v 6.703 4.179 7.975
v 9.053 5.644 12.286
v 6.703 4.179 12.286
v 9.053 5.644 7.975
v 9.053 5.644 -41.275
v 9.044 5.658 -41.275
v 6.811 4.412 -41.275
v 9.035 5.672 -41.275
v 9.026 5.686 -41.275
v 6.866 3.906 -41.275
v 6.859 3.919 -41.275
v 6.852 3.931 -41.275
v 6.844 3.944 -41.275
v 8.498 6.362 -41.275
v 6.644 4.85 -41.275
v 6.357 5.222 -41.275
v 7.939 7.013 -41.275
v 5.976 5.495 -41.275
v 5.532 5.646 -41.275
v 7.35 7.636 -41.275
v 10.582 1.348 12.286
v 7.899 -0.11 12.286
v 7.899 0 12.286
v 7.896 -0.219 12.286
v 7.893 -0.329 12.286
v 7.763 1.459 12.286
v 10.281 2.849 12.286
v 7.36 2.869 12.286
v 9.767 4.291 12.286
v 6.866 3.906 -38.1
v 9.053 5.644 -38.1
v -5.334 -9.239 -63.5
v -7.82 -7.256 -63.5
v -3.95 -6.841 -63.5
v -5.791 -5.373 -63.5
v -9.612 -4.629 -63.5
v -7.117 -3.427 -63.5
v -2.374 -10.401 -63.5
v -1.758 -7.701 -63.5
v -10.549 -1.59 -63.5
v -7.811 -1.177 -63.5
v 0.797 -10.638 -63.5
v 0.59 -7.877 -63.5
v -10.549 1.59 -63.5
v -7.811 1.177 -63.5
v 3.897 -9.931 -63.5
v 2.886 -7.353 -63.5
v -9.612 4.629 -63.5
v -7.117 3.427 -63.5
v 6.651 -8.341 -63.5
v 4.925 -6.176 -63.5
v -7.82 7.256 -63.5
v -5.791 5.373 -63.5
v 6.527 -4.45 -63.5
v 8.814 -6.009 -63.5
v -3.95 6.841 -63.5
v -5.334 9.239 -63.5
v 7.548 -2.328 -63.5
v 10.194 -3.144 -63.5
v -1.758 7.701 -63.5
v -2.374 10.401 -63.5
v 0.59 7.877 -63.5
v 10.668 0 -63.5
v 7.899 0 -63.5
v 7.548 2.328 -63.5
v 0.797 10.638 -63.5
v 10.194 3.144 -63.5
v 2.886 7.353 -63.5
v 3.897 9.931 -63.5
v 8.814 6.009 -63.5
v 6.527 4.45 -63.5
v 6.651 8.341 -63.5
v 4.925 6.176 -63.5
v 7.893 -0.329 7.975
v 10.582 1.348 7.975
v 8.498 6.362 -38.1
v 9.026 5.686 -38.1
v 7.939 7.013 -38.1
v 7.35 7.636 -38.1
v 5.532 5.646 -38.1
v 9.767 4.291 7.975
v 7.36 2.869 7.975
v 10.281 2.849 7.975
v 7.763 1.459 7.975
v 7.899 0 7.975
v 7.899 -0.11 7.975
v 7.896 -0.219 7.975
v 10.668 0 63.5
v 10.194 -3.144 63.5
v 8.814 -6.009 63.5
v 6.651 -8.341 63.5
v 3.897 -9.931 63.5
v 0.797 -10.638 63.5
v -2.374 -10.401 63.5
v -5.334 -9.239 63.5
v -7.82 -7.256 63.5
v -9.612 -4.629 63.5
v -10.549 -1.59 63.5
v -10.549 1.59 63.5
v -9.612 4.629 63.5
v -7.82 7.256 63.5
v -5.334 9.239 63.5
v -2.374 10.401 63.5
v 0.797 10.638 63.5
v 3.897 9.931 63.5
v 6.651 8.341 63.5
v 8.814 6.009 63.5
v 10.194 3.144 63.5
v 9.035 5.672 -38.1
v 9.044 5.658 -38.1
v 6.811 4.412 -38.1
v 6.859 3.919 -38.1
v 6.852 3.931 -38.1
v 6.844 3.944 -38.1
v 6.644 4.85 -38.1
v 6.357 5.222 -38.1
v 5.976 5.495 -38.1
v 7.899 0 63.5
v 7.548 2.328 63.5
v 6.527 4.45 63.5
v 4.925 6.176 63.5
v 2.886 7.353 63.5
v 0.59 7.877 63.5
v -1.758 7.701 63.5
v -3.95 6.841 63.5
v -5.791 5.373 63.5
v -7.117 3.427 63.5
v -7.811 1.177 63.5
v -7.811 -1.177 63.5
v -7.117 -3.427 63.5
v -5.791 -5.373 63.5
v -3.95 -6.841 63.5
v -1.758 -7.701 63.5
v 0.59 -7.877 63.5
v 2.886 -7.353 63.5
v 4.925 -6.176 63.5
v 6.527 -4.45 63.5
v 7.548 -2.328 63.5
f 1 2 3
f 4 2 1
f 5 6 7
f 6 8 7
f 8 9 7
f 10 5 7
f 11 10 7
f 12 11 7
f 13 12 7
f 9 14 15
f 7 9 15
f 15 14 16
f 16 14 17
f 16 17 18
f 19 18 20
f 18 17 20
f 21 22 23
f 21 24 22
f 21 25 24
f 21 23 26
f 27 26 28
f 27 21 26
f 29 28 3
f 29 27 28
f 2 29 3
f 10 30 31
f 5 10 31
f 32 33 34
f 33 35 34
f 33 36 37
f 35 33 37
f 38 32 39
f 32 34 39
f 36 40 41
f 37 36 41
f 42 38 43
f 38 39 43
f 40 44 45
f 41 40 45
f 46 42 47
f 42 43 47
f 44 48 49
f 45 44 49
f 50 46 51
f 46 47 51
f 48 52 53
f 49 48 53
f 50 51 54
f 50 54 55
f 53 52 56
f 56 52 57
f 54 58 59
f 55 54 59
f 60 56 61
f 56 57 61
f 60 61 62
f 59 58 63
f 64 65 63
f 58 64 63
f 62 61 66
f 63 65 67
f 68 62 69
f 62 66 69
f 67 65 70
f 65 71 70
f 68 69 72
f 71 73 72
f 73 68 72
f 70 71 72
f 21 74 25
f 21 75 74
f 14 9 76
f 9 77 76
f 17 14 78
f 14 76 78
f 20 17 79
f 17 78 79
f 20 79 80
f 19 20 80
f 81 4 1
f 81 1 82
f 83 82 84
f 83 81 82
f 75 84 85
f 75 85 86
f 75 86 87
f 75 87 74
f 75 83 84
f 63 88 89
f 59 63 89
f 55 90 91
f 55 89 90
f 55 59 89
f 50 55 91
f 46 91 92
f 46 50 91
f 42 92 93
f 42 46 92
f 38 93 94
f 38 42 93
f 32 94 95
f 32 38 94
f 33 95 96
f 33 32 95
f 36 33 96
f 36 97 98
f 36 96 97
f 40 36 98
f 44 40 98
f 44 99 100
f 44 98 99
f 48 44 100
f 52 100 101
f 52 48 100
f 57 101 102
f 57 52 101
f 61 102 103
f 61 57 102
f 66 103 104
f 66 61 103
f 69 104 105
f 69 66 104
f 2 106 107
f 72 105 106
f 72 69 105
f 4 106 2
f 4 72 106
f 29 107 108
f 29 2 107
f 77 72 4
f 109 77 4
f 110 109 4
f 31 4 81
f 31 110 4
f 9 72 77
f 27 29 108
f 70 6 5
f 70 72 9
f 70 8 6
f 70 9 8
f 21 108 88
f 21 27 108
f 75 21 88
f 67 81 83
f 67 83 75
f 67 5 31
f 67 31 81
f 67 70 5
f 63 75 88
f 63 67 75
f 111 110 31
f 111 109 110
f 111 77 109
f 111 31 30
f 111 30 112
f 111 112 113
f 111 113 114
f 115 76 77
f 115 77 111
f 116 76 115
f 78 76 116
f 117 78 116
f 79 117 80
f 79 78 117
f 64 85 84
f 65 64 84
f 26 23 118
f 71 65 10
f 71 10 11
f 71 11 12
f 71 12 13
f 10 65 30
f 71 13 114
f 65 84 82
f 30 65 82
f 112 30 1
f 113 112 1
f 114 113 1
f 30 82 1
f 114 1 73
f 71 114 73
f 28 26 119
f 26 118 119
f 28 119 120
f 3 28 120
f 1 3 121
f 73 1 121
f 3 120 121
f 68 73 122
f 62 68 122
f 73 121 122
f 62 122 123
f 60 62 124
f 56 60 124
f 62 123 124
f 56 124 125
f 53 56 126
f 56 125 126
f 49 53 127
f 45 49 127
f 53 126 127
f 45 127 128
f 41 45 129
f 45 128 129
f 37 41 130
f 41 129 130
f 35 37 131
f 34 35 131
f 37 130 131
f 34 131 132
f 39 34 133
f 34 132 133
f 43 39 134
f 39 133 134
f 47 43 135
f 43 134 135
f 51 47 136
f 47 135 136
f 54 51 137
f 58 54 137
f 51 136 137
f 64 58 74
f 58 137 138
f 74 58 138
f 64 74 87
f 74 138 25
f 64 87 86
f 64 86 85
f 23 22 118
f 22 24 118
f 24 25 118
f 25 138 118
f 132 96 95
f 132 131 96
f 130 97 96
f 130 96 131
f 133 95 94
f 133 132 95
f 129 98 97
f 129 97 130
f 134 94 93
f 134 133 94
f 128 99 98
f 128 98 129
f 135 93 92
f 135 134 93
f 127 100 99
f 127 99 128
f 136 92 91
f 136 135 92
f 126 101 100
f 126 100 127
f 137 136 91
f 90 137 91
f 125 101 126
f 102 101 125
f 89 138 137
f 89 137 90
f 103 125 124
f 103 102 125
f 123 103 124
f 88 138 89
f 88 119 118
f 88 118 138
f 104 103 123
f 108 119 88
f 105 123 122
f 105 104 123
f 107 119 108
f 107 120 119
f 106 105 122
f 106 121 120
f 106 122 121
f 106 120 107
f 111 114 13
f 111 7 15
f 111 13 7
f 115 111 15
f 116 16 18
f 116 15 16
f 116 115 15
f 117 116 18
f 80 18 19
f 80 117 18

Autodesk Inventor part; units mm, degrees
ref_plane "YZ Plane" through (0, 0, 0) normal (1, 0, 0) x (0, 1, 0)
ref_plane "XZ Plane" through (0, 0, 0) normal (0, 1, 0) x (-1, 0, 0)
ref_plane "XY Plane" through (0, 0, 0) normal (0, 0, 1) x (1, 0, 0)
sketch "Sketch1" plane through (0, 0, 0) normal (0, 0, 1) x (1, 0, 0)
  circle A0 centre (0, 0) radius 7.8994
  circle A1 centre (0, 0) radius 10.668
  dimension "d0" = 15.7988
  dimension "d2" = 21.336
extrude "Extrusion1" add sketch "Sketch1" along normal mid plane 127
ref_plane "Work Plane1" through (0, 0, -38.1) normal (0, 0, -1) x (-1, 0, 0)
sketch "Sketch3" plane through (0, 0, -38.1) normal (0, 0, -1) x (-1, 0, 0)
  line L0 (-7.3505, 7.6359) -> (-5.5315, 5.6464)
  line L1 (-5.5315, 5.6464) -> (-7.3505, 7.6359)
  line L2 (-6.8389, 3.8843) -> (-9.0558, 5.6464)
  arc A0 (-7.3505, 7.6359) -> (-9.0558, 5.6464) centre (5.6213, -5.2084) ccw
  arc A1 (-5.5315, 5.6464) -> (-6.8389, 3.8843) centre (-5.2401, 4.0642) ccw
  point P0 (0, 0)
extrude "Extrusion3" cut sketch "Sketch3" along normal blind 3.175
ref_plane "Work Plane3" through (9.0527, 5.644, 0) normal (0.8486, 0.5291, 0) x (-0.5291, 0.8486, 0)
sketch "Sketch4" plane through (9.0527, 5.644, 0) normal (0.8486, 0.5291, 0) x (-0.5291, 0.8486, 0)
  line L0 (0, 12.2855) -> (0, 7.9748)
  line L1 (0, 7.9748) -> (-4.4544, 7.9748)
  line L2 (-4.4544, 7.9748) -> (-4.4544, 12.2855)
  line L3 (-4.4544, 12.2855) -> (0, 12.2855)
  point P0 (0, 0)
extrude "Extrusion4" cut sketch "Sketch4" against normal blind 6.35
properties part number "PVC Spacer 500 Sched 40" material "PVC-Piping"
